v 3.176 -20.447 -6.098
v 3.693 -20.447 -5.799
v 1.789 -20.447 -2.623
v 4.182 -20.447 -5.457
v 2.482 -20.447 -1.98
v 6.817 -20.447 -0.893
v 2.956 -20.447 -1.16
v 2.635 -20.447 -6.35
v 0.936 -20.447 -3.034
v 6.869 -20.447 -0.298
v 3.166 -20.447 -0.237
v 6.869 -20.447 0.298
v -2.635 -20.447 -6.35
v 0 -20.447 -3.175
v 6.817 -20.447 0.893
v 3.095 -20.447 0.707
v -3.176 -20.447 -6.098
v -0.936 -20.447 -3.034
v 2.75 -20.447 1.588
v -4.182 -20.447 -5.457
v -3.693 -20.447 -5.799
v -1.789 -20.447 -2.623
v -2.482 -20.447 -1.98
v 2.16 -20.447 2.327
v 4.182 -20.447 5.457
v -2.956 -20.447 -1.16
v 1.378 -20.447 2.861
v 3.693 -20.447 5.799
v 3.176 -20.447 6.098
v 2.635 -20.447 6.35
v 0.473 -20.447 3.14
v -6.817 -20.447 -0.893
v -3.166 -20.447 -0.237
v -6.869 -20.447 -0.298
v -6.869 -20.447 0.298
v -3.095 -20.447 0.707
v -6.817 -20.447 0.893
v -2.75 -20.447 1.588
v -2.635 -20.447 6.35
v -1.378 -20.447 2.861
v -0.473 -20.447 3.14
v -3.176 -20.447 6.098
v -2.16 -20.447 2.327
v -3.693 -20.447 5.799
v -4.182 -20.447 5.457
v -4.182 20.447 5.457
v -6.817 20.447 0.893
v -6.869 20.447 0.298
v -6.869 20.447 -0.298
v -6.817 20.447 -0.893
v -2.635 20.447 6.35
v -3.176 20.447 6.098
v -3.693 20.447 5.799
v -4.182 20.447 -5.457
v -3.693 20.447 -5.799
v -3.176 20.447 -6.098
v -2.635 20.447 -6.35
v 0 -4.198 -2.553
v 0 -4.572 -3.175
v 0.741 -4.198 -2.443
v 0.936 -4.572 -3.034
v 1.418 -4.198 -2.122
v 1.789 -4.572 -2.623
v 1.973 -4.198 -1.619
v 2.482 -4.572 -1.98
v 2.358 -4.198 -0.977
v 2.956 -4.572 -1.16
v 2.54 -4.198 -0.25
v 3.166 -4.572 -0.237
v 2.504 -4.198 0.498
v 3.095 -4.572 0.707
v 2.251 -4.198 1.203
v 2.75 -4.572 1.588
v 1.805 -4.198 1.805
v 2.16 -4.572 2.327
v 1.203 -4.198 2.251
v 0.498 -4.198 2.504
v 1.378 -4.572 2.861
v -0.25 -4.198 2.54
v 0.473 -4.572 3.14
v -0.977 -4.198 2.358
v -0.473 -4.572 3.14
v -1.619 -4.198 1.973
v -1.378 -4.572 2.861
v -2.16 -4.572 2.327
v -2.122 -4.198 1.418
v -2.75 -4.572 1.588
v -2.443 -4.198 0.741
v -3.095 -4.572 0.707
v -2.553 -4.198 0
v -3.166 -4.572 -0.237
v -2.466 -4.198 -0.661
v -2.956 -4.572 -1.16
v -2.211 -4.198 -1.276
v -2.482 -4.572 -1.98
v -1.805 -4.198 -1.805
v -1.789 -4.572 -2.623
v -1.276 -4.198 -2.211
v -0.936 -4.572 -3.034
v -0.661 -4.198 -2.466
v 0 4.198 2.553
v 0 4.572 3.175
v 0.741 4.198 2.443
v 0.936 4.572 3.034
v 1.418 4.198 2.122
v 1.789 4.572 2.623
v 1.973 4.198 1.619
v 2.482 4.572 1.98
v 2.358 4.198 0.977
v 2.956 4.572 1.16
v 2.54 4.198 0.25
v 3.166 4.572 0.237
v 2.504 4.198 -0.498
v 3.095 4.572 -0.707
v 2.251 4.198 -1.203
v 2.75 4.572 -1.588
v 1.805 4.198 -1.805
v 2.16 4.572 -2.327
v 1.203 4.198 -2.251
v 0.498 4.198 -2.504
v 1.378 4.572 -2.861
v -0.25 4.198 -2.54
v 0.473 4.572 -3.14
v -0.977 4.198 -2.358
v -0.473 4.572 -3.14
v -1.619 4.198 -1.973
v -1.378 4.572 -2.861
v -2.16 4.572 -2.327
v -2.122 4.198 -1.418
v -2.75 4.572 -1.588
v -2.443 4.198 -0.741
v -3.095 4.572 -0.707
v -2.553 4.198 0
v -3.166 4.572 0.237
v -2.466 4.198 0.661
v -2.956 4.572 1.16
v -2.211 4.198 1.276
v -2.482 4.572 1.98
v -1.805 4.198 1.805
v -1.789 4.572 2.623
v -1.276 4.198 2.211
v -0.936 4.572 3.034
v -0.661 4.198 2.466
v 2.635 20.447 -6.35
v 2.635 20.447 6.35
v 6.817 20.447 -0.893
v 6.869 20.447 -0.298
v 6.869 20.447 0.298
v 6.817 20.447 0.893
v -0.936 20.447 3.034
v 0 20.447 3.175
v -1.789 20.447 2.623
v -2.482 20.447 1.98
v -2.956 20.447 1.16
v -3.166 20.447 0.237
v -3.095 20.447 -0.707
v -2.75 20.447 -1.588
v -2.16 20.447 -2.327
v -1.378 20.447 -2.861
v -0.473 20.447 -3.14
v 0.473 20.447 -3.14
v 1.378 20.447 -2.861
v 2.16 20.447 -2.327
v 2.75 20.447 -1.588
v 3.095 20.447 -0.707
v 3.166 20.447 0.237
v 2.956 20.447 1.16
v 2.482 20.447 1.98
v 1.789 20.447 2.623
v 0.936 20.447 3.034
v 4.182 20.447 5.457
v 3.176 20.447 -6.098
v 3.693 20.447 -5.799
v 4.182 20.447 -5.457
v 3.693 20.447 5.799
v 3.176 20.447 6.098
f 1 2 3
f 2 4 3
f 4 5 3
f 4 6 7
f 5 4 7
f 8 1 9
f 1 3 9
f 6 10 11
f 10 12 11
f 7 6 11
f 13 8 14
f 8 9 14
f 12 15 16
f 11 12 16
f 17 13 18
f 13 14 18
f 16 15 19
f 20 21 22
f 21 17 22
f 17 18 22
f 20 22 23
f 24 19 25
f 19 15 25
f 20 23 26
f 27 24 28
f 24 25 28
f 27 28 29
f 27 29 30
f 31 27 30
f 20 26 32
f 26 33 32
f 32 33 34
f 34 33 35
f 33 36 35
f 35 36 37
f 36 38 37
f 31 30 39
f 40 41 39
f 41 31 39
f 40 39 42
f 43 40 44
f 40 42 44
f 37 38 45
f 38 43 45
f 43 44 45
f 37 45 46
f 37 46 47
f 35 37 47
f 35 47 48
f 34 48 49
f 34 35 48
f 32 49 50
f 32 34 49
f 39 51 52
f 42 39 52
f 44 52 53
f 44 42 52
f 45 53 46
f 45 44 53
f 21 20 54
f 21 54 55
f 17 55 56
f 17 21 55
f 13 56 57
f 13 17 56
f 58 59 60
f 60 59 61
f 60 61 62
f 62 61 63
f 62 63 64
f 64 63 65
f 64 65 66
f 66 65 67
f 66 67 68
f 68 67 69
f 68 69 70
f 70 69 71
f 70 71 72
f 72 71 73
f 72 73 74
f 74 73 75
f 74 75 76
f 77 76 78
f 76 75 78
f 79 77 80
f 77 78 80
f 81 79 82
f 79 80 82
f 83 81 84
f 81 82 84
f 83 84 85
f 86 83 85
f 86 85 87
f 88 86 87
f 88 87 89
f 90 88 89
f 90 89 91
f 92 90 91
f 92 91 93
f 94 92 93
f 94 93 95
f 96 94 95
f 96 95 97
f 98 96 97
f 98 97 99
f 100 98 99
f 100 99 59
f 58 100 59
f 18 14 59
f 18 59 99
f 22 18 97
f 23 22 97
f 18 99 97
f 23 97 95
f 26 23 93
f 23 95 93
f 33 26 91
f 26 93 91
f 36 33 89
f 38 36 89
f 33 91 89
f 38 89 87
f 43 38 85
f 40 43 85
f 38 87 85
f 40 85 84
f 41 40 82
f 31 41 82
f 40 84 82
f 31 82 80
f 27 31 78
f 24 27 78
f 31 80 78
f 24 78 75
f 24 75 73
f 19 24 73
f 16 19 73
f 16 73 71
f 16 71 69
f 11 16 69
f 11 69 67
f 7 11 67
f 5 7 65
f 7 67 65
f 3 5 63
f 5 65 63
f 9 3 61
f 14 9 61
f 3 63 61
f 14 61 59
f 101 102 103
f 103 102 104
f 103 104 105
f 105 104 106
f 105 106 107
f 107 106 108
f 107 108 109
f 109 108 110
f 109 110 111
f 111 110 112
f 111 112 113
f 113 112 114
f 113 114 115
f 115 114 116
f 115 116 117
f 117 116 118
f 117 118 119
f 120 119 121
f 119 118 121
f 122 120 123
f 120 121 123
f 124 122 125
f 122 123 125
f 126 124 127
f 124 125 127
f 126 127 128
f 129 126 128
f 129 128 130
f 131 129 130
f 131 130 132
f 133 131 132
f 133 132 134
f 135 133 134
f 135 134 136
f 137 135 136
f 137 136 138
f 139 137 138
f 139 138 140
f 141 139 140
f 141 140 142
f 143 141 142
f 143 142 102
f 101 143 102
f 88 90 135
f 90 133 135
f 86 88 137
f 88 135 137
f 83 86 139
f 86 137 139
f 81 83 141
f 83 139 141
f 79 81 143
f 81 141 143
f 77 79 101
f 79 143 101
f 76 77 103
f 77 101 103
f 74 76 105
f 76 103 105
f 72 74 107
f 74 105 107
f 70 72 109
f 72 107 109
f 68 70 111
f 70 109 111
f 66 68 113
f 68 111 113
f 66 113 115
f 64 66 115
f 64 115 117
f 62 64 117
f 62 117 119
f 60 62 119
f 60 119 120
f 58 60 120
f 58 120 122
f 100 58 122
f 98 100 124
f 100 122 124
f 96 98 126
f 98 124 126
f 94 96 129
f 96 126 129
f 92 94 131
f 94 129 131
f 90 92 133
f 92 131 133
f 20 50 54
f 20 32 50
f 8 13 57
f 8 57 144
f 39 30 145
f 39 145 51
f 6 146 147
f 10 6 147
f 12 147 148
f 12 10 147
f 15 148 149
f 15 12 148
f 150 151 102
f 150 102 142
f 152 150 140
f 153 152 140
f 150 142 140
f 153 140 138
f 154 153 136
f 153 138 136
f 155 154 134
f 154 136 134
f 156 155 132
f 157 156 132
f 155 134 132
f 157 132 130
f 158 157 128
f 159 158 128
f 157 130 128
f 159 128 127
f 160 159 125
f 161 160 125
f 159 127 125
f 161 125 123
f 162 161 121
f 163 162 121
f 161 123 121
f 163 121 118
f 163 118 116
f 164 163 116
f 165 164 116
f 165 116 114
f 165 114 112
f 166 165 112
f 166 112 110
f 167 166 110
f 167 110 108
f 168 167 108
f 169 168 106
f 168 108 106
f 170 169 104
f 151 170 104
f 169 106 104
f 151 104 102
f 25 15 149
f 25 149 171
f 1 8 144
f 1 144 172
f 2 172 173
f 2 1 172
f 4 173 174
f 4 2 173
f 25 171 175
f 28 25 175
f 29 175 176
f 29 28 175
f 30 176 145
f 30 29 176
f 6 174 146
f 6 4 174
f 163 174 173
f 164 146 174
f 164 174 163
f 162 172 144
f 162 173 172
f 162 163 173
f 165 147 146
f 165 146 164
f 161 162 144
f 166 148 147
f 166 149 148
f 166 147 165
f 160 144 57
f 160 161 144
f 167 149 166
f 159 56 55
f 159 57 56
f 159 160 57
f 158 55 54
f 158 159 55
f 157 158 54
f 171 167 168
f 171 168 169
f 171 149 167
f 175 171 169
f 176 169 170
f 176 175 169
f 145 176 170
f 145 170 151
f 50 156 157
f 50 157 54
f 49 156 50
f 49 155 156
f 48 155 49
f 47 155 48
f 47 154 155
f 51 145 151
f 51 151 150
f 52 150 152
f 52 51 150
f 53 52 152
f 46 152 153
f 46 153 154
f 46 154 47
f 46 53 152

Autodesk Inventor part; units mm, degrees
ref_plane "YZ Plane" through (0, 0, 0) normal (1, 0, 0) x (0, 1, 0)
ref_plane "XZ Plane" through (0, 0, 0) normal (0, 1, 0) x (-1, 0, 0)
ref_plane "XY Plane" through (0, 0, 0) normal (0, 0, 1) x (1, 0, 0)
sketch "Sketch1" plane through (0, 0, 0) normal (0, 1, 0) x (-1, 0, 0)
  line L0 (-7.3323, 0) -> (-3.6662, 6.35)
  line L1 (-3.6662, 6.35) -> (3.6662, 6.35)
  line L2 (3.6662, 6.35) -> (7.3323, 0)
  line L3 (7.3323, 0) -> (3.6662, -6.35)
  line L4 (3.6662, -6.35) -> (-3.6662, -6.35)
  line L5 (-3.6662, -6.35) -> (-7.3323, 0)
  circle A0 centre (0, 0) radius 6.875
  circle A1 centre (0, 0) radius 6.35
  line L6 (-2.7496, -4.7625) -> (2.7496, -4.7625)
  line L7 (2.7496, -4.7625) -> (5.4993, 0)
  line L8 (5.4993, 0) -> (2.7496, 4.7625)
  line L9 (2.7496, 4.7625) -> (-2.7496, 4.7625)
  line L10 (-2.7496, 4.7625) -> (-5.4993, 0)
  line L11 (-5.4993, 0) -> (-2.7496, -4.7625)
  circle A2 centre (0, 0) radius 4.7625
  circle A3 centre (0, 0) radius 5.125
  circle A4 centre (0, 0) radius 9.525
  circle A5 centre (0, 0) radius 5.9436
  circle A6 centre (0, 0) radius 2.5527
  circle A7 centre (0, 0) radius 2.0193
  circle A8 centre (0, 0) radius 3.175
  circle A9 centre (0, 0) radius 8.7313
  point P0 (-4.1818, 5.457)
  point P1 (-2.635, 6.35)
  point P2 (-6.8168, -0.893)
  point P3 (-6.8168, 0.893)
  point P4 (-2.635, -6.35)
  point P5 (-4.1818, -5.457)
  point P6 (4.1818, -5.457)
  point P7 (2.635, -6.35)
  point P8 (6.8168, -0.893)
  point P9 (6.8168, 0.893)
  point P10 (2.635, 6.35)
  point P11 (4.1818, 5.457)
  point P12 (3.1778, -4.0208)
  point P13 (1.8932, -4.7625)
  point P14 (5.071, -0.7417)
  point P15 (5.071, 0.7417)
  point P16 (1.8932, 4.7625)
  point P17 (3.1778, 4.0208)
  point P18 (-3.1778, 4.0208)
  point P19 (-1.8932, 4.7625)
  point P20 (-5.071, -0.7417)
  point P21 (-5.071, 0.7417)
  point P22 (-1.8932, -4.7625)
  point P23 (-3.1778, -4.0208)
  dimension "d0" = 12.7
  dimension "d1" = 13.75
  dimension "d2" = 12.7
  dimension "d3" = 9.525
  dimension "d4" = 10.25
  dimension "d5" = 19.05
  dimension "d6" = 11.8872
  dimension "d7" = 5.1054
  dimension "d8" = 4.0386
  dimension "d9" = 6.35
  dimension "d153" = 0.7937
extrude "BaseProfile625Round" add sketch "Sketch1" along normal mid plane 40.894 contours L0 A0 L5 | A0 L0 | L0 A1 L5 A0 | L5 A0 | L0 A0 L1 A1 | A1 | L0 L1 A0 | A1 L4 A0 L5 | A0 L4 L5 | L1 A0 | L1 A0 L2 A1 | A1 L3 A0 L4 | L4 A0 | L1 L2 A0 | L2 A0 | L2 A0 L3 A1 | A0 L3 L4 | L3 A0 | L2 L3 A0 | L11 A3 L6 | A3 L11 A2 L6 | L6 A3 | A3 L11 | A2 L7 A3 L6 | A2 | A3 L7 L6 | L11 A3 L10 A2 | L11 L10 A3 | L7 A3 | A2 L8 A3 L7 | L10 A3 | L10 A3 L9 A2 | A3 L8 L7 | L10 L9 A3 | L9 A3 | L9 A3 L8 A2 | L8 A3 | L9 L8 A3 | A4 | A5 | A6 | A7 | A8 | A9
extrude "BaseProfileRoundTube" [suppressed]
extrude "BaseProfile500Hex" [suppressed]
extrude "BaseProfile500Thunderhex" cut sketch "Sketch1" along normal mid plane 914.4 contours L0 A0 L5 | A0 L0 | L5 A0 | L0 L1 A0 | A0 L4 L5 | L1 A0 | L4 A0 | L1 L2 A0 | L2 A0 | A0 L3 L4 | L3 A0 | L2 L3 A0 | A4 | A9
extrude "BaseProfile500Round" [suppressed]
extrude "BaseProfile375Hex" [suppressed]
extrude "BaseProfile375Thunderhex" [suppressed]
extrude "BaseProfile375Round" [suppressed]
extrude "TopShaftProfile1Hex500" [suppressed]
extrude "TopShaftProfile1ThunderHex500" [suppressed]
extrude "TopShaftProfile1Round500" [suppressed]
extrude "TopShaftProfile1Hex375" [suppressed]
extrude "TopShaftProfile1ThunderHex375" [suppressed]
extrude "TopShaftProfile1Round375" [suppressed]
extrude "TopShaftProfile2ThunderHex500" [suppressed]
extrude "TopShaftProfile2Round500" [suppressed]
extrude "TopShaftProfile2Hex375" [suppressed]
extrude "TopShaftProfile2ThunderHex375" [suppressed]
extrude "TopShaftProfile2Round375" [suppressed]
sketch "Sketch2" plane through (0, 0, 0) normal (1, 0, 0) x (0, 1, 0)
  line L0 (-40.8112, 0) -> (47.9537, 0) projected
  line L1 (0, -2.6658) -> (0, 15.9951) projected
  line L2 (27.5895, 4.4704) -> (28.7325, 4.4704)
  line L3 (28.7325, 4.4704) -> (28.7325, 4.7625)
  line L4 (28.7325, 4.7625) -> (29.812, 4.7625)
  line L5 (29.812, 4.7625) -> (30.32, 4.2545)
  line L6 (30.32, 4.2545) -> (30.32, 0)
  line L7 (27.5895, 4.4704) -> (27.5895, 0) construction
  line L8 (27.5895, 4.4704) -> (27.5895, 4.7625)
  line L9 (27.5895, 4.7625) -> (20.447, 4.7625)
  line L10 (20.447, 4.7625) -> (20.447, 0)
  line L11 (20.447, 0) -> (30.32, 0)
  line L12 (-20.447, 5.9436) -> (-21.59, 5.9436)
  line L13 (-21.59, 5.9436) -> (-21.59, 6.35)
  line L14 (-21.59, 6.35) -> (-22.6695, 6.35)
  line L15 (-22.6695, 6.35) -> (-23.1775, 5.842)
  line L16 (-23.1775, 5.842) -> (-23.1775, 0)
  line L17 (-20.447, 5.9436) -> (-20.447, 0) construction
  line L18 (-20.447, 5.9436) -> (-20.447, 6.35)
  line L19 (-20.447, 6.35) -> (-20.447, 6.35)
  line L20 (-20.447, 6.35) -> (-20.447, 0)
  line L21 (-20.447, 0) -> (-23.1775, 0)
  line L22 (0, 0) -> (0, 13.3292)
  line L23 (20.447, 0) -> (20.447, 4.7625)
  point P0 (25.4, 5.9436)
  point P1 (-23.1775, 0)
  point P2 (-20.447, 0)
  point P3 (30.955, 4.7625)
  point P4 (-17.4625, 6.2865)
  point P5 (25.4, 4.7625)
  point P6 (19.4005, 4.7625)
  point P7 (-25.4, 4.7625)
  point P8 (-26.543, 4.7625)
  dimension "TopBearingRoundDia2" = 9.525
  dimension "d65" = 45
  dimension "RetainingRingChamferSize2" = 0.508
  dimension "d72" = 20.447
  dimension "TopSnapRingDia2" = 8.9408
  dimension "d119" = 0.508
  dimension "d120" = 45
  dimension "d135" = 20.447
  dimension "d138" = 30.32
  dimension "d139" = 28.7325
  dimension "d140" = 27.5895
  dimension "d141" = 11.8872
  dimension "d142" = 12.7
  dimension "d143" = 21.59
  dimension "d144" = 20.447
  dimension "d145" = 23.1775
revolve "TopRetentionGroove&BearingRound" [suppressed]
sketch "Sketch3" plane through (0, 20.447, 0) normal (0, 1, 0) x (1, 0, 0)
  point P0 (0, 0)
  point P1 (0, 0)
hole "TopShaftTappedHole" at (0, 20.447, 0) direction (0, -1, 0) diameter 6.35 depth 15.875 tip angle 118
thread "TopShaftThread" size "1/4-20 UNC" class "2B" standard "ANSI Unified Screw Threads" length 12.7
extrude "BottomShaftProfile1Hex500" [suppressed]
extrude "BottomShaftProfile1ThunderHex500" [suppressed]
extrude "BottomShaftProfile1Round500" [suppressed]
extrude "BottomShaftProfile1Hex375" [suppressed]
extrude "BottomShaftProfile1ThunderHex375" [suppressed]
extrude "BottomShaftProfile2ThunderHex500" [suppressed]
extrude "BottomShaftProfile1Round375" [suppressed]
extrude "BottomShaftProfile2Round500" [suppressed]
extrude "BottomShaftProfile2Hex375" [suppressed]
extrude "BottomShaftProfile2ThunderHex375" [suppressed]
extrude "BottomShaftProfile2Round375" [suppressed]
sketch "Sketch4" plane through (0, -20.447, 0) normal (0, -1, 0) x (1, 0, 0)
  point P0 (0, 0)
  point P1 (0, 0)
hole "BottomShaftTappedHole" at (0, -20.447, 0) direction (0, 1, 0) diameter 6.35 depth 15.875 tip angle 118
thread "BottomShaftThread" size "1/4-20 UNC" class "2B" standard "ANSI Unified Screw Threads" length 12.7
revolve "BottomRetentionGroove&BearingRound" [suppressed]
extrude "BaseProfile375ThunderhexHole" [suppressed]
extrude "BaseProfile500ThunderhexHole" cut sketch "Sketch1" along normal mid plane 914.4 contours A6 | A7
equation "\"d18\" = BottomShaftProfile1Depth + TopShaftProfile1Depth + BaseShaftLength + TopShaftProfile2Depth + BottomShaftProfile2Depth"
equation "\"d72\" = 0.5 * d18"
equation "\"BaseShaftLength\" = 40.894"
equation "\"TopShaftProfile1Depth\" = 0"
equation "\"TopShaftProfile2Depth\" = 0"
equation "\"BottomShaftProfile1Depth\" = 0"
equation "\"BottomShaftProfile2Depth\" = 0"
equation "\"TopShaftHoleDia\" = 6.35"
equation "\"BottomShaftHoleDia\" = 6.35"
equation "\"TopBearingRoundDia\" = 9.525"
equation "\"TopGrooveWidth\" = 1.143"
equation "\"TopBearingRoundDistance\" = 7.14248"
equation "\"TopSnapRingDia\" = 8.9408"
equation "\"BottomBearingRoundDia\" = 12.7"
equation "\"BottomGrooveWidth\" = 1.143"
equation "\"BottomBearingRoundDistance\" = 0"
equation "\"BottomSnapRingDia\" = 11.8872"
equation "\"RoundTubeDia\" = 19.05"
properties part number "GreyT Claw 2 Gearbox Shaft" material "Aluminum 6061"
